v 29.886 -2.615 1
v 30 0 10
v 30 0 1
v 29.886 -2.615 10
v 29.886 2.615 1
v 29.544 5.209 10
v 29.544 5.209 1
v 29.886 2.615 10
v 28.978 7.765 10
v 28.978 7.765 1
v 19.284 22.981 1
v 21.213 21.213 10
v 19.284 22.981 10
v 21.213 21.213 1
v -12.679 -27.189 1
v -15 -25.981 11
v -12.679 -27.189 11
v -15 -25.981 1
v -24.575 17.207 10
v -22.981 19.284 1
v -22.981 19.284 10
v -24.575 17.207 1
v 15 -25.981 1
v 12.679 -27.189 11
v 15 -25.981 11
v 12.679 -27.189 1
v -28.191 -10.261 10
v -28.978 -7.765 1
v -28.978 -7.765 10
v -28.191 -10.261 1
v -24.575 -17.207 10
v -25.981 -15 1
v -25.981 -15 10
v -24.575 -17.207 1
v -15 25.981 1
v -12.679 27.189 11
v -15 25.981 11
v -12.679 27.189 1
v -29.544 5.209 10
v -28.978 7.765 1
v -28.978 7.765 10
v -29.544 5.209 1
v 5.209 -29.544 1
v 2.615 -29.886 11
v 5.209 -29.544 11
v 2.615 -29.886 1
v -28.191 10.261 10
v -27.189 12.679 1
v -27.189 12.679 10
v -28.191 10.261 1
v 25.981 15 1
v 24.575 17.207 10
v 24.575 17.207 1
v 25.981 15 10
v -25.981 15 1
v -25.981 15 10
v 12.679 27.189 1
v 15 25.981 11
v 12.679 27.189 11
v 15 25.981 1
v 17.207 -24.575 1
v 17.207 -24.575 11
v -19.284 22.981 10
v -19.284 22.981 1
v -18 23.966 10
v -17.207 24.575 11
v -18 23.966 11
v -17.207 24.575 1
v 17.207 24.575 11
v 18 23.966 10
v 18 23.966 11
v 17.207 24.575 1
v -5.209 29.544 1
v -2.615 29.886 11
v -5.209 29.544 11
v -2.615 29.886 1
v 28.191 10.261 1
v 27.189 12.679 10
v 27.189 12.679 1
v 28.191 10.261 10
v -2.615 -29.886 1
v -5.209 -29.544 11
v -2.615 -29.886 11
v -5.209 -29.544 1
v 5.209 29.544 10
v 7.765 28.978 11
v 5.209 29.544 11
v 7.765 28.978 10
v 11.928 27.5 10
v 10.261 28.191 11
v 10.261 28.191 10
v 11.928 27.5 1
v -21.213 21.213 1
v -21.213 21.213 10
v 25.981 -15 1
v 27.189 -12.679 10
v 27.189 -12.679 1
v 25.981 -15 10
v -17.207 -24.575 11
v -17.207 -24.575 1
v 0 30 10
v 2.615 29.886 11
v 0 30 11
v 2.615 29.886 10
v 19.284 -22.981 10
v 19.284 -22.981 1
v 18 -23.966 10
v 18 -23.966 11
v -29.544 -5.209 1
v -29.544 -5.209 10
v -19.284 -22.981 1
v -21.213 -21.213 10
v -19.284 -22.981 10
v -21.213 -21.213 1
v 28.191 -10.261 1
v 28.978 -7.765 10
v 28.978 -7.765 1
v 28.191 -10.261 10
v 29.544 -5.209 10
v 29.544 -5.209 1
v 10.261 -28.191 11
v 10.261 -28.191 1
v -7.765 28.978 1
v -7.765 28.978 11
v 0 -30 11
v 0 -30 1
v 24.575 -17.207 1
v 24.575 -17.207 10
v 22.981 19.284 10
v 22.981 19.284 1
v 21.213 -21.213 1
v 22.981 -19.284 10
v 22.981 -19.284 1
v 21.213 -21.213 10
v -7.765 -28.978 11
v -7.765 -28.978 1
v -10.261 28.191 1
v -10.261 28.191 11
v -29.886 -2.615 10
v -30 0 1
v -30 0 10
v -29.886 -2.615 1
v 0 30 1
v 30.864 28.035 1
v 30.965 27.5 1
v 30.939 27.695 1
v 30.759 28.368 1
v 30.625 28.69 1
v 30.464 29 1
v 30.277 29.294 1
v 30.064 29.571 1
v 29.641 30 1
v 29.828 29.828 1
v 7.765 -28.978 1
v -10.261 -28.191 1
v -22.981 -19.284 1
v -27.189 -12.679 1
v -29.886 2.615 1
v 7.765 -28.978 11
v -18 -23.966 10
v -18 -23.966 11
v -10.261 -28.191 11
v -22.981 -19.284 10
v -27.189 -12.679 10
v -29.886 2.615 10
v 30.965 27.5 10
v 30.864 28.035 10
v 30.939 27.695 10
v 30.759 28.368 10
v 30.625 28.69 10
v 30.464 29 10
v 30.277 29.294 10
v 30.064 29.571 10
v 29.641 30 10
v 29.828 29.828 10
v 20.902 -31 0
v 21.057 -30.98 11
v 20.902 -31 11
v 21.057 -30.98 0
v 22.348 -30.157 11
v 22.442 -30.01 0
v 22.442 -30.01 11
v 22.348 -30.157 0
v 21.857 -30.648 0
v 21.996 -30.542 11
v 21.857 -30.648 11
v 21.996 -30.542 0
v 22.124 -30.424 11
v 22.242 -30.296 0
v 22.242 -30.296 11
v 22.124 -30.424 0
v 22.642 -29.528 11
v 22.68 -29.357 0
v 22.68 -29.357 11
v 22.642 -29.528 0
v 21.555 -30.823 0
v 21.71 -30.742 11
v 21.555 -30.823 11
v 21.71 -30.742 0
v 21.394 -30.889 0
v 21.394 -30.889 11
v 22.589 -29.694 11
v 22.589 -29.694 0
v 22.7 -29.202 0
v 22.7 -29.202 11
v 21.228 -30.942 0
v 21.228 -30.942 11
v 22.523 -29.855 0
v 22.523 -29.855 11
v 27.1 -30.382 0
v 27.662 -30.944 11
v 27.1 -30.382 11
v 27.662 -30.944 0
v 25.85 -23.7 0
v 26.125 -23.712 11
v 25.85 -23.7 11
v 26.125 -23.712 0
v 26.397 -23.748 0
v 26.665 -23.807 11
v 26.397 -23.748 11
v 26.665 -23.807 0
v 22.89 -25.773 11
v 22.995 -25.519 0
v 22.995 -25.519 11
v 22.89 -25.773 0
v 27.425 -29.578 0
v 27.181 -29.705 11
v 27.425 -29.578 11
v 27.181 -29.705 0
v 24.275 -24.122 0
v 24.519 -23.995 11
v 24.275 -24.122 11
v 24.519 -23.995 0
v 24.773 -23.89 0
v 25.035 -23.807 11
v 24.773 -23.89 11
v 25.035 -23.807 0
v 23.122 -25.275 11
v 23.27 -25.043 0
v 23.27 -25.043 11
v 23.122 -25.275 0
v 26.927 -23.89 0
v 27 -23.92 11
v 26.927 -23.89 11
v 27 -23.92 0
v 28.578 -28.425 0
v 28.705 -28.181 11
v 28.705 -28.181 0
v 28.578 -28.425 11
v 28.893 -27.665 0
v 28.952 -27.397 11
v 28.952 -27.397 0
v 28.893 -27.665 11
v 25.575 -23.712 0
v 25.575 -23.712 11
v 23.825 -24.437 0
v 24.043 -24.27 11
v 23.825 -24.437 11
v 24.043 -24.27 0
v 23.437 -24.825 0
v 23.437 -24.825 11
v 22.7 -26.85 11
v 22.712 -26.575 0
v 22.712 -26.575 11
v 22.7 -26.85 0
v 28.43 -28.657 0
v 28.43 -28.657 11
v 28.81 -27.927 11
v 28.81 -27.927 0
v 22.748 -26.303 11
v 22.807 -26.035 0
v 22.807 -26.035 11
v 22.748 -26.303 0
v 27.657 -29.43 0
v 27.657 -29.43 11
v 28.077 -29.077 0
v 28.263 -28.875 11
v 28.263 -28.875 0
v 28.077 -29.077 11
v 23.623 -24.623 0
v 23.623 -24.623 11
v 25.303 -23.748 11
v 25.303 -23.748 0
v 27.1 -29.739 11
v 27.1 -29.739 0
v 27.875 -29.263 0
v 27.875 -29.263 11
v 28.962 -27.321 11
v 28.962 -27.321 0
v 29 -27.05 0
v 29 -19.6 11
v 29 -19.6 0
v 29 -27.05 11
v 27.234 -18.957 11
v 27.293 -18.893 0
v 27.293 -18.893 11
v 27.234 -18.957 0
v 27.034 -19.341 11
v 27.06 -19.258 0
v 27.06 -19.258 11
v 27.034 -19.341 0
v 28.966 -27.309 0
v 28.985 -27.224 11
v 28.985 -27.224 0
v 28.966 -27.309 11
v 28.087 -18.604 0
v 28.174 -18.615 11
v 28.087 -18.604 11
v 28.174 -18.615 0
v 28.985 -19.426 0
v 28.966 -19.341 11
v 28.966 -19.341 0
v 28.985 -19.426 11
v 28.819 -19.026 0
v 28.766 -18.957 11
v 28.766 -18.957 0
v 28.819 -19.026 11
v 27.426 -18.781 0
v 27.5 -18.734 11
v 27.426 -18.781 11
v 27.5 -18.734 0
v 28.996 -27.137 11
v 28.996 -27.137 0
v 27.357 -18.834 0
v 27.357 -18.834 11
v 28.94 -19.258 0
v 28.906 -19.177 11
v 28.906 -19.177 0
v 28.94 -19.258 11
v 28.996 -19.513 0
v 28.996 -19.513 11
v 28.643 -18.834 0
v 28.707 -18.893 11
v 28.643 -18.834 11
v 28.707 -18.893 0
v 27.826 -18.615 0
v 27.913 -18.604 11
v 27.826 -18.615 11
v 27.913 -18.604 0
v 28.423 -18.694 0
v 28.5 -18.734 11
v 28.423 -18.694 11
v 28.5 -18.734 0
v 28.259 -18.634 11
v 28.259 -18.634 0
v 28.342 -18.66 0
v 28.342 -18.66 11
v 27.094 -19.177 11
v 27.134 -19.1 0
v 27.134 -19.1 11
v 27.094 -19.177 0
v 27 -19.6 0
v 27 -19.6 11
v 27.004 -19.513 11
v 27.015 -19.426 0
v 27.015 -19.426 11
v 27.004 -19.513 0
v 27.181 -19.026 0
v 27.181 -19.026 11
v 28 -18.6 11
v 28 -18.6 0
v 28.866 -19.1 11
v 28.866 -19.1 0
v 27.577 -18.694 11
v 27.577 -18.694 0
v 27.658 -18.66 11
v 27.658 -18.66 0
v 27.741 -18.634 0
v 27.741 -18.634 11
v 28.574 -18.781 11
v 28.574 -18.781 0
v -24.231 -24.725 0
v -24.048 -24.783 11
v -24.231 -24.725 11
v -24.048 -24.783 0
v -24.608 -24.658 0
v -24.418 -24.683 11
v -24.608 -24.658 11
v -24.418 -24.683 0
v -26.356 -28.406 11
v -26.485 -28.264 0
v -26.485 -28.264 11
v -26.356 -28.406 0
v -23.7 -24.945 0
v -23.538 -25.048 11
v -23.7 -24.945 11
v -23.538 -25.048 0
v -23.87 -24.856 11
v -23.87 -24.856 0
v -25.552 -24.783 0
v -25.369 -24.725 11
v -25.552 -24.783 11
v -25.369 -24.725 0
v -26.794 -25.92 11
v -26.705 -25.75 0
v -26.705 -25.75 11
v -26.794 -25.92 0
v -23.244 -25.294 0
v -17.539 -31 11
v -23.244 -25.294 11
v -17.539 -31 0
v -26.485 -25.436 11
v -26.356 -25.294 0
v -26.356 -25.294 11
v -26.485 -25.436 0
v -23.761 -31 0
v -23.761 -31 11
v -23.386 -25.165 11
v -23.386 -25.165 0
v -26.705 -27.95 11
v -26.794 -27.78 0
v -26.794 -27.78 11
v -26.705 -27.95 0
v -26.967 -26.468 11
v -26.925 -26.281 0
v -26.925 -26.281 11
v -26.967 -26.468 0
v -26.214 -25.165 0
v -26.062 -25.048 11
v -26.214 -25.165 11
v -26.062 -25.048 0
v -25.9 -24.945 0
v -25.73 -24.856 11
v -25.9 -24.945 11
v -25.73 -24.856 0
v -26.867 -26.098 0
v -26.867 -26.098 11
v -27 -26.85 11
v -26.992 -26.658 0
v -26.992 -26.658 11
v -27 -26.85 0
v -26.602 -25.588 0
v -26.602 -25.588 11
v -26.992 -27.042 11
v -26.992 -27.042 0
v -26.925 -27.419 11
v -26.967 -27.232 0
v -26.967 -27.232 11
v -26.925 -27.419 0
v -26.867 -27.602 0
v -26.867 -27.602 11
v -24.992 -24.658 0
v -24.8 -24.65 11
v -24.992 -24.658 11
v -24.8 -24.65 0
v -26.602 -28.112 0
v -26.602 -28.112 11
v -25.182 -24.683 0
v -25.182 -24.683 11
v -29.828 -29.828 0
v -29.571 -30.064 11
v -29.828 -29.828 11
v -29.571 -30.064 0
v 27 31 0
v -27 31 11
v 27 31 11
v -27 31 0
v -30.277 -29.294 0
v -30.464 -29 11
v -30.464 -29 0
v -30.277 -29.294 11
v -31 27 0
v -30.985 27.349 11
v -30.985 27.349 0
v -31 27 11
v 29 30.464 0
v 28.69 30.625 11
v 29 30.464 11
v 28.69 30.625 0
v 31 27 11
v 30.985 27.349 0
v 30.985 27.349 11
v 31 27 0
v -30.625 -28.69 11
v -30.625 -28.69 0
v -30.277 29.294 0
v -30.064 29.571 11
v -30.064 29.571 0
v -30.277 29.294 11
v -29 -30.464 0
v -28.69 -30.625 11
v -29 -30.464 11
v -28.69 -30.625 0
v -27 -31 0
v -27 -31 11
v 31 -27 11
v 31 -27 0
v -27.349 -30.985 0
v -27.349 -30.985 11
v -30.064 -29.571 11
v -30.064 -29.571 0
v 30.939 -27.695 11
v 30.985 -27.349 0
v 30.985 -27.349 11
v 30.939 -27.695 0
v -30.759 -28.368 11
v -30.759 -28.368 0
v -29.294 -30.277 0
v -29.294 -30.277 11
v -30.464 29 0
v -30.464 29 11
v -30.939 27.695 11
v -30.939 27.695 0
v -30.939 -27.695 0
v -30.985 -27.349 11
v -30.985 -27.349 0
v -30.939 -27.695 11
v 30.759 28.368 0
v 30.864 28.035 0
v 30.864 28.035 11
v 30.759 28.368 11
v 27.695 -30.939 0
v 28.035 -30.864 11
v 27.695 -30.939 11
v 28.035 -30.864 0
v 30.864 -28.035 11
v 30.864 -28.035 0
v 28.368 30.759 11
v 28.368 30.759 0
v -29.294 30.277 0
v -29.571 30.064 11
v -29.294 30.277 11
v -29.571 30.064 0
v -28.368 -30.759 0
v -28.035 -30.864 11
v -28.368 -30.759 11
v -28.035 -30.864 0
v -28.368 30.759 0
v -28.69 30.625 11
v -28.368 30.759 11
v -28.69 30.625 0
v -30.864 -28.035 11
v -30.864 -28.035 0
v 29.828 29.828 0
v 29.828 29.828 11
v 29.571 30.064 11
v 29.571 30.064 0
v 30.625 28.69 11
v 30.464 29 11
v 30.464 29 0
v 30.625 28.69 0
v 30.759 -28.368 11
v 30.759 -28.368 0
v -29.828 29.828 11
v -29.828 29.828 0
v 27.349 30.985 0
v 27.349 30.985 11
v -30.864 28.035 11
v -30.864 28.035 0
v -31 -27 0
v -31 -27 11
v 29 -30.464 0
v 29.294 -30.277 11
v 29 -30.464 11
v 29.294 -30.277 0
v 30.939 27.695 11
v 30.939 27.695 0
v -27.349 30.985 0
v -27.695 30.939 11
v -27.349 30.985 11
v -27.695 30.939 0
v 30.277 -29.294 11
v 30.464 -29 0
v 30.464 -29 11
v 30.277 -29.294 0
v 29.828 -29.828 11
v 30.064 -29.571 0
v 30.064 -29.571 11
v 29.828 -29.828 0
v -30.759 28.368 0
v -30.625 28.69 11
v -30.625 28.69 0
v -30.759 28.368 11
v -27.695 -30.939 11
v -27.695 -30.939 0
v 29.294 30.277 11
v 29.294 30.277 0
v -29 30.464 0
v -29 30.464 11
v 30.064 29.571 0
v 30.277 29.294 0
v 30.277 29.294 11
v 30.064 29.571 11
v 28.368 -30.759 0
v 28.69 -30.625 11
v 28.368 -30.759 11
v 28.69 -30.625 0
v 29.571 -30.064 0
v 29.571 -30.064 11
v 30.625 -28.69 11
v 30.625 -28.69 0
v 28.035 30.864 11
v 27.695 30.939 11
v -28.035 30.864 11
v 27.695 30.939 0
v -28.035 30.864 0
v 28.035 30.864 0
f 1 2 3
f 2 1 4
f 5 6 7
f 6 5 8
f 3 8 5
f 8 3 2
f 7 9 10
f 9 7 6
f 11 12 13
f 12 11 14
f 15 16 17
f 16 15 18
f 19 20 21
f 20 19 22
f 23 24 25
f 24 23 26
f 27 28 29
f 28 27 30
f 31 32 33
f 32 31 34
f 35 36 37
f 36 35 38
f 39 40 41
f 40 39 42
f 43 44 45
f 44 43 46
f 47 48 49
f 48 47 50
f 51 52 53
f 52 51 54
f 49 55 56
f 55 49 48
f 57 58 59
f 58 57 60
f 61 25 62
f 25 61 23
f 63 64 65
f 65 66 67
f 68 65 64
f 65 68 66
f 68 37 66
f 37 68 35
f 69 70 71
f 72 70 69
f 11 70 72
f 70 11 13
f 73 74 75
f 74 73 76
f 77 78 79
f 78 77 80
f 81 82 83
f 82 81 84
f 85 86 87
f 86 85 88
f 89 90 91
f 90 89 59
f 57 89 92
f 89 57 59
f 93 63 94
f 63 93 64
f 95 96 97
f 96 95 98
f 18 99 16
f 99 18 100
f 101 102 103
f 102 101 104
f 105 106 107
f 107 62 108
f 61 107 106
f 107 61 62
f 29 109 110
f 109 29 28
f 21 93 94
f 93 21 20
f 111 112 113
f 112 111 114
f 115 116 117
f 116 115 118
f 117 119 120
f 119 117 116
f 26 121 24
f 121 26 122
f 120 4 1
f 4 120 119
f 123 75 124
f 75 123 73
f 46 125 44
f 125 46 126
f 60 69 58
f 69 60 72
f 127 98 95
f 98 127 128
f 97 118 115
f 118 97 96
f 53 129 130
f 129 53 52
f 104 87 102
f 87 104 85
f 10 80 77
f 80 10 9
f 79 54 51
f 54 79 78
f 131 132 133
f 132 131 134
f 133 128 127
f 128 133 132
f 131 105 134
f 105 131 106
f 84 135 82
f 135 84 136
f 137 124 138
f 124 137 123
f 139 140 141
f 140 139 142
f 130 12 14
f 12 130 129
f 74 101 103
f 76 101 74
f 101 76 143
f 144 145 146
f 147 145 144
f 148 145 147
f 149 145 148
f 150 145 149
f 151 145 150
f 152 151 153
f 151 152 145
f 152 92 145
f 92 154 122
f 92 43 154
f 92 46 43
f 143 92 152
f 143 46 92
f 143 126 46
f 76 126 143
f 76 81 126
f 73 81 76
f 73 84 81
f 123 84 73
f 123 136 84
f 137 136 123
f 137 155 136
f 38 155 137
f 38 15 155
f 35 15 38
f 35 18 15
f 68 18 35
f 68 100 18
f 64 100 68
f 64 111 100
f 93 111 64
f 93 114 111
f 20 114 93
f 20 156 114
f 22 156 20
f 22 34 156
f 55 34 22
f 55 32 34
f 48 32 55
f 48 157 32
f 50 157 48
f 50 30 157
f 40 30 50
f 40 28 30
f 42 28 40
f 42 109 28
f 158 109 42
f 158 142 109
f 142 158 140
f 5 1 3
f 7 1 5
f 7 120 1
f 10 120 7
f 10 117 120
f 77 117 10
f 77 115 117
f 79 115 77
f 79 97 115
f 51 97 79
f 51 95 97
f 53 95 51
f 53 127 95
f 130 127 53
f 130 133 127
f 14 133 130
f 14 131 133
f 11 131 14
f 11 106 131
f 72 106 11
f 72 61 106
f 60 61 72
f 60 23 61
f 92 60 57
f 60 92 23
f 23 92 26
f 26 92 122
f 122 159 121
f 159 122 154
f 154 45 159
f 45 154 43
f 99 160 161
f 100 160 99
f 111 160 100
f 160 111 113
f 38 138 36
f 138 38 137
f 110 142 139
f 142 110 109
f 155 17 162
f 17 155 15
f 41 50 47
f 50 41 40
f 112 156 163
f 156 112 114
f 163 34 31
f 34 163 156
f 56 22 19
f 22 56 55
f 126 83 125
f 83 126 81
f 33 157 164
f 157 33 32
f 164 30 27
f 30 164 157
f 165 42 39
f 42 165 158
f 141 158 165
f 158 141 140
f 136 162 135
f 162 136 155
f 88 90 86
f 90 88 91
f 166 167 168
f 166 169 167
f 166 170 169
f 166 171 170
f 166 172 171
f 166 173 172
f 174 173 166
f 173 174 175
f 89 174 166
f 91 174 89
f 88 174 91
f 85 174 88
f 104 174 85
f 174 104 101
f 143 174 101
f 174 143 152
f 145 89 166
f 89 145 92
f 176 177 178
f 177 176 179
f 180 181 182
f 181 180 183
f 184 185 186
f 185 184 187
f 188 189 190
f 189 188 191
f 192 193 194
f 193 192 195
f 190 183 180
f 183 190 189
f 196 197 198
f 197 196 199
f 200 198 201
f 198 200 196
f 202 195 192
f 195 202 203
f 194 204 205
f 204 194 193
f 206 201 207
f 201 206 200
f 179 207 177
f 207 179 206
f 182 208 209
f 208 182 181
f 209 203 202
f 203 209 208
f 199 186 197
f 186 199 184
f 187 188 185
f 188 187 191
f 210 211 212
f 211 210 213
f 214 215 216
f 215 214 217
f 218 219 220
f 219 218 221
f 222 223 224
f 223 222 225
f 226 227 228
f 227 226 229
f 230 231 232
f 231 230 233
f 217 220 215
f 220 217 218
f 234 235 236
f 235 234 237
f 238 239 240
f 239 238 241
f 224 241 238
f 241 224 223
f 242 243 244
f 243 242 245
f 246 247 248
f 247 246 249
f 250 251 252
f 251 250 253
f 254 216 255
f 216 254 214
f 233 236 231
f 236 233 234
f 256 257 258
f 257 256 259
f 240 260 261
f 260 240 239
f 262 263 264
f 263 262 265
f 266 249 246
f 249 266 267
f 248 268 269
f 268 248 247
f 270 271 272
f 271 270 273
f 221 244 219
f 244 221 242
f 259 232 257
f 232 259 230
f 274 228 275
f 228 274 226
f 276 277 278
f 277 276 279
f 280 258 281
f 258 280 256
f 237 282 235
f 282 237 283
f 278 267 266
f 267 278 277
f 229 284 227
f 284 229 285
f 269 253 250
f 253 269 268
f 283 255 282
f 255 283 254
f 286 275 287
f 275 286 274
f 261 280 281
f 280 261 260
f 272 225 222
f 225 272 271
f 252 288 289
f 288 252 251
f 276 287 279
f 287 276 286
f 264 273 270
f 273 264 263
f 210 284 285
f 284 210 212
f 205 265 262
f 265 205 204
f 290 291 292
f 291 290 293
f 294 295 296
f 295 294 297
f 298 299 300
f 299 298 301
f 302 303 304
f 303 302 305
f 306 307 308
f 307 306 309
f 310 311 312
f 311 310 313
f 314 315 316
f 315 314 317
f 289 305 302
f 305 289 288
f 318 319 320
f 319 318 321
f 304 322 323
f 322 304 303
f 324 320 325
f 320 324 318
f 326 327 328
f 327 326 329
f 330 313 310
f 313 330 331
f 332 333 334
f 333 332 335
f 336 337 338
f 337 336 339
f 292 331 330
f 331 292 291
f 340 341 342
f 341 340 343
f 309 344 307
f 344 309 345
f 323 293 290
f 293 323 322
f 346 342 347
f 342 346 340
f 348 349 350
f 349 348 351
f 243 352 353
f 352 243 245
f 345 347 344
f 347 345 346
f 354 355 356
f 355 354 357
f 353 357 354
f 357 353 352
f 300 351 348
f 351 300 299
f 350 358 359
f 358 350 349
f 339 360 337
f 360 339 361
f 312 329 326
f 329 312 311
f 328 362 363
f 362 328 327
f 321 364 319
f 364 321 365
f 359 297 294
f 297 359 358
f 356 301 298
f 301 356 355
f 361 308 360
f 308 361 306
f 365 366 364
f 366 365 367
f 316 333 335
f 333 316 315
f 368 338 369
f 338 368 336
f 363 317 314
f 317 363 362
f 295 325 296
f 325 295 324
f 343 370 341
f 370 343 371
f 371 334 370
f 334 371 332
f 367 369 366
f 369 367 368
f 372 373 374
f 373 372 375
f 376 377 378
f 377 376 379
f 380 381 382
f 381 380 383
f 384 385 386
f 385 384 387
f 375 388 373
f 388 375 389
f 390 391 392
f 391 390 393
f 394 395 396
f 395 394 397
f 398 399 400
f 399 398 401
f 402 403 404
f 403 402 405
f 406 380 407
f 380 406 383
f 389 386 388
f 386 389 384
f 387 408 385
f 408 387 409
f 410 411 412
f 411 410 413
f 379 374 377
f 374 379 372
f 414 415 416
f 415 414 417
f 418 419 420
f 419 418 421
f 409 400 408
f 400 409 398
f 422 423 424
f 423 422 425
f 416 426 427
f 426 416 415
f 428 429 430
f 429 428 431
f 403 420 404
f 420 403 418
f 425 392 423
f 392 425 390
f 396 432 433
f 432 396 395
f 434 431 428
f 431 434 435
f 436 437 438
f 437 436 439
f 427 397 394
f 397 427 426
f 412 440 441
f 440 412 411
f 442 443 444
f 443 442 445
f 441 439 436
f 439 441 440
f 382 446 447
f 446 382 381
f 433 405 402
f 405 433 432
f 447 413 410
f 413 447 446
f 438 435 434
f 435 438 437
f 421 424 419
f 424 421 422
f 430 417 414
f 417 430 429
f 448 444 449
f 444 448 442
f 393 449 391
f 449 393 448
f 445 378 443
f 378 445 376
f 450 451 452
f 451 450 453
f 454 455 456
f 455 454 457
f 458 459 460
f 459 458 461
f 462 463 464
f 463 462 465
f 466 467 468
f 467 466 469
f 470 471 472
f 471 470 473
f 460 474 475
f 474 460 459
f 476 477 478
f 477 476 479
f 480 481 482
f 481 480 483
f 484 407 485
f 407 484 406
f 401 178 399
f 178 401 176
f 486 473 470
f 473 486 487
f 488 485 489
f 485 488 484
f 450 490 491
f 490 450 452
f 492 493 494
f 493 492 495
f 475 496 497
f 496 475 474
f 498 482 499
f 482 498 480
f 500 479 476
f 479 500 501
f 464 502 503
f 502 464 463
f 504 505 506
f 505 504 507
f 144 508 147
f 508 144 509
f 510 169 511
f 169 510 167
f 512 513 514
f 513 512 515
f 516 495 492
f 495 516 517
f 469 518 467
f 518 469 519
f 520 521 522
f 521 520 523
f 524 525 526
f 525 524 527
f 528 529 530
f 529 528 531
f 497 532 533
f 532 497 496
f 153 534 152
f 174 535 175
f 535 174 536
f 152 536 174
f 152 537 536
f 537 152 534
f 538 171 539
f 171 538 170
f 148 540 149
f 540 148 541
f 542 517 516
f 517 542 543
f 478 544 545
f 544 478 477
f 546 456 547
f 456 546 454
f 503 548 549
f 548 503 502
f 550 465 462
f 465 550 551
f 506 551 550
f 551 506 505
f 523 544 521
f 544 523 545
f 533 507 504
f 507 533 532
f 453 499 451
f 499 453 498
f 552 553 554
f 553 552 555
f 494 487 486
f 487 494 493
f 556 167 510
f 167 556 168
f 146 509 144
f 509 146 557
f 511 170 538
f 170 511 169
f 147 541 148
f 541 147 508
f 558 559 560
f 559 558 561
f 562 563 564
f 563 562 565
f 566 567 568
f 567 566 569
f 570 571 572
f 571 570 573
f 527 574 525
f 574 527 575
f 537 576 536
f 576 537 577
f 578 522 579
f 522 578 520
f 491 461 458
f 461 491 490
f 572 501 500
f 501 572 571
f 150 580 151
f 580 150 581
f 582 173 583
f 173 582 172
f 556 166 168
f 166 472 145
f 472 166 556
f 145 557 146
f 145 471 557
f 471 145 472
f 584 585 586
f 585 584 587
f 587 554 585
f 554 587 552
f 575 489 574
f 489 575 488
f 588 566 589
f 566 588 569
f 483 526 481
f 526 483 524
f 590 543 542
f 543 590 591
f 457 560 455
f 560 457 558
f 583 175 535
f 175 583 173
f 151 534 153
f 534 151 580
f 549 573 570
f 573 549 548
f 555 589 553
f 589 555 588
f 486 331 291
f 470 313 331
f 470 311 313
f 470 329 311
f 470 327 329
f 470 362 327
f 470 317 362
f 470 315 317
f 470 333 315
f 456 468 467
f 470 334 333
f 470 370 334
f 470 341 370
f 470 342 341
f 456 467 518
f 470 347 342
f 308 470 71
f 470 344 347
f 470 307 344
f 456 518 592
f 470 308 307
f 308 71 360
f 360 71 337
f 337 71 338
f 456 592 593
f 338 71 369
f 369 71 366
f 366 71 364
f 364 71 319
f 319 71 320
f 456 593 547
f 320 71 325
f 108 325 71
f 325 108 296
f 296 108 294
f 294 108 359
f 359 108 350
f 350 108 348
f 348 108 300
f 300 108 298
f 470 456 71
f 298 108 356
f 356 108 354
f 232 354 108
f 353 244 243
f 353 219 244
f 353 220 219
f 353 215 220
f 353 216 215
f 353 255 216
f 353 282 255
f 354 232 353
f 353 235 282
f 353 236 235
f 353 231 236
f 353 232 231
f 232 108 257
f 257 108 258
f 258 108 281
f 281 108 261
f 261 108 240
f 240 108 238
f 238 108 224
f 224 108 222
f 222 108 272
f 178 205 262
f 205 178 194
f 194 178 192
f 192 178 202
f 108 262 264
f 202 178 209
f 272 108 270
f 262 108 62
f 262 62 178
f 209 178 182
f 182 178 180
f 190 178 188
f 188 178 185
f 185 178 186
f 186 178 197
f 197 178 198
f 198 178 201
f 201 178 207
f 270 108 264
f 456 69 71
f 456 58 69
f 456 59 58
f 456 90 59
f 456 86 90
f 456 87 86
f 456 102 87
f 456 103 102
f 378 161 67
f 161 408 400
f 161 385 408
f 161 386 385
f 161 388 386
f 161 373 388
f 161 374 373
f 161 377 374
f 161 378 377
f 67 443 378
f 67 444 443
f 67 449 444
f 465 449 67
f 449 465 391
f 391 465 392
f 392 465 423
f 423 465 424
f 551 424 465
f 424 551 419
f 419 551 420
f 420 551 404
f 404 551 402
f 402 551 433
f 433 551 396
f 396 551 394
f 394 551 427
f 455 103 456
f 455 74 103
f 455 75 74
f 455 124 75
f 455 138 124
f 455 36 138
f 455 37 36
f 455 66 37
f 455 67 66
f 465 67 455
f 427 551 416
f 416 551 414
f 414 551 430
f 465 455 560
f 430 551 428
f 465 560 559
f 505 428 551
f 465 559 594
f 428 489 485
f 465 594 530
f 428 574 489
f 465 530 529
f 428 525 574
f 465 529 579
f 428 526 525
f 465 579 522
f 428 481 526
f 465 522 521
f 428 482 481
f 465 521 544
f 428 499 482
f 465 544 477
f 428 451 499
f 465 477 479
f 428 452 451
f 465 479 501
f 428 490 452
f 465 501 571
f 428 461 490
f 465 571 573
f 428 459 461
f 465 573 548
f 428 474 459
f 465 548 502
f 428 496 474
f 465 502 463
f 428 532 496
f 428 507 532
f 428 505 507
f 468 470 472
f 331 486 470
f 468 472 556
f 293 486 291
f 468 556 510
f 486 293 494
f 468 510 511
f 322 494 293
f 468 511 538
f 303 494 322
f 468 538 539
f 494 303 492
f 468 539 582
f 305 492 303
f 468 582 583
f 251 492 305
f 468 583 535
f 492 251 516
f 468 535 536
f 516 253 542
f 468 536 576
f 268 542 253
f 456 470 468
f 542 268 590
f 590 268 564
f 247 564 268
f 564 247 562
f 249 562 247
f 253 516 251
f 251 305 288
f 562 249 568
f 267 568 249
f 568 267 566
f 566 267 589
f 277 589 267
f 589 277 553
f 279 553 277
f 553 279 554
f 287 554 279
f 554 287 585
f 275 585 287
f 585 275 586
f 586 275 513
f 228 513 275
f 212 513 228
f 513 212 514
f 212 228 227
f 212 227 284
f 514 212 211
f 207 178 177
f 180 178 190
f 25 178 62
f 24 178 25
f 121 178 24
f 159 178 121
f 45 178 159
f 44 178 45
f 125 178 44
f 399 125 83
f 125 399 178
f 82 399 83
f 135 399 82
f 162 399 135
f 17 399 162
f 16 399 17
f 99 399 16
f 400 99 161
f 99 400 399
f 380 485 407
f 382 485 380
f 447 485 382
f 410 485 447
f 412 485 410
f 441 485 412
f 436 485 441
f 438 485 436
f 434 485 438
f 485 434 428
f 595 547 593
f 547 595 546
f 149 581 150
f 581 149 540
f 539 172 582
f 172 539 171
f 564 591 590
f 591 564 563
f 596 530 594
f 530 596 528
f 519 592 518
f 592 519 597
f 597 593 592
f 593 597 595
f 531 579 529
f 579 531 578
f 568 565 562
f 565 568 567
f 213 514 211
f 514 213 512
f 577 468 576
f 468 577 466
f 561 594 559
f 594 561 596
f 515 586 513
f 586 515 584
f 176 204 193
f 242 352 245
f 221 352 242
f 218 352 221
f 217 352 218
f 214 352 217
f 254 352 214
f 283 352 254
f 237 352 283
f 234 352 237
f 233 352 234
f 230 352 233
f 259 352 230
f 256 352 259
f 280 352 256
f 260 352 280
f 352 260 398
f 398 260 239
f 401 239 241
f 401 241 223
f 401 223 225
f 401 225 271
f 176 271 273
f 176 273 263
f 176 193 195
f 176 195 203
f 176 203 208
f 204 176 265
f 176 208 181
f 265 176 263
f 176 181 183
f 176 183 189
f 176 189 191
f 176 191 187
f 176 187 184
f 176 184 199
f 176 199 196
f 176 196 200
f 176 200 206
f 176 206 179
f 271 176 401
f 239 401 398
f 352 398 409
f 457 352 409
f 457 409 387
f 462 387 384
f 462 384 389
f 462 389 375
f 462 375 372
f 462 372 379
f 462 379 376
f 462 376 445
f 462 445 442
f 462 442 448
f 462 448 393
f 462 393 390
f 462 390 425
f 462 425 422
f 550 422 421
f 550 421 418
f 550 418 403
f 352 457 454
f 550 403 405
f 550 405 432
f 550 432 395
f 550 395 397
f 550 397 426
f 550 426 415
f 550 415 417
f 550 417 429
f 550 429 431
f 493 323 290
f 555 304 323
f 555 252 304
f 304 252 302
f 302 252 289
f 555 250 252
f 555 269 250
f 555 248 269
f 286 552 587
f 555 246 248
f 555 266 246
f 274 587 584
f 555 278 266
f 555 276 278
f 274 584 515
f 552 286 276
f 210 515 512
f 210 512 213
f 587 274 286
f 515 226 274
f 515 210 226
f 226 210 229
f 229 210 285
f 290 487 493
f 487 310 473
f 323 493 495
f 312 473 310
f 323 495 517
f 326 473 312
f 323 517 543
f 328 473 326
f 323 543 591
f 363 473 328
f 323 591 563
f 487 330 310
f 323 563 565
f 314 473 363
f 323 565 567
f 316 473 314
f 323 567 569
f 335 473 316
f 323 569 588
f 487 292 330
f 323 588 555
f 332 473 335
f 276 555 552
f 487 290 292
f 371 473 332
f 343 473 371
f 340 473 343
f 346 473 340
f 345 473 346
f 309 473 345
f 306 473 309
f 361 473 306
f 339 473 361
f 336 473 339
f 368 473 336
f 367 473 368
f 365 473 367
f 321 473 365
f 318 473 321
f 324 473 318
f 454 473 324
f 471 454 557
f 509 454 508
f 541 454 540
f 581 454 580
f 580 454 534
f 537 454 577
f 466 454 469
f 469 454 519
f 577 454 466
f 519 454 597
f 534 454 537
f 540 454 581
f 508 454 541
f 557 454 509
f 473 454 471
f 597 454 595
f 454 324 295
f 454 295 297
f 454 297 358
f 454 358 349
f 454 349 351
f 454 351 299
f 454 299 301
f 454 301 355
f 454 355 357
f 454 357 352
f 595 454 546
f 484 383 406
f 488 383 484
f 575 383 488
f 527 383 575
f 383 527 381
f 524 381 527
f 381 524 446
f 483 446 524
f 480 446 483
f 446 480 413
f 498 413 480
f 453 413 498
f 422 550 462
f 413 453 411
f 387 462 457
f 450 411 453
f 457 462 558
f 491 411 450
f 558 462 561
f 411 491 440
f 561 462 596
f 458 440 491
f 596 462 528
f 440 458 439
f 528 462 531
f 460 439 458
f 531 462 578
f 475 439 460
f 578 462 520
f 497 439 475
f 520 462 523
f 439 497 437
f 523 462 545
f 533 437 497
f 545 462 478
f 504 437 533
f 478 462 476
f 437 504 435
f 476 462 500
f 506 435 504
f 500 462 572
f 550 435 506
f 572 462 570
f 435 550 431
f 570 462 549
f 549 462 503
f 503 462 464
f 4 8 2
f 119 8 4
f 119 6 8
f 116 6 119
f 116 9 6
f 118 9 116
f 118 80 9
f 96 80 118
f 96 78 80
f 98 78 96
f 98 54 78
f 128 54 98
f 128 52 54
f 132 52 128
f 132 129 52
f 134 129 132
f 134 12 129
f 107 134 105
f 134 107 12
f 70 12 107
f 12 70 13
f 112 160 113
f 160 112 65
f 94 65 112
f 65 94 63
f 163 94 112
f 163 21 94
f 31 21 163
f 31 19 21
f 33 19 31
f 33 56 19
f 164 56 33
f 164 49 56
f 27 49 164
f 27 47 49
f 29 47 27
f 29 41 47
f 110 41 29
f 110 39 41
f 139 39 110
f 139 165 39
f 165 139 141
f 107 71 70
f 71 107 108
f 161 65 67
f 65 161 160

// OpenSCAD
// SMDispenser.scad
// SMD component dispenser
// CC-BY-SA
// Brian K. White - b.kenyon.w@gmail.com 2025

// to adjust fit, wobble, snap, etc:
// look at these bvariables below:
//   fitment_clearance = gap left between mating parts
//   detent_height = how far the clip is forced to deflect
//   clip_thickness = thickness (stiffness) of the clip

//PRINT = "base";
PRINT = "caddy";
//PRINT = "cap"; // end cap, only needed if spool_retainer_walls=false
//PRINT = "testkit"; // caddy and stubby base for quick print for test fitting
preview_fully_populated = false;

// MAIN USER OPTIONS

// CADDY SIZE
// Fitment clearances are already added to the given strip dimensions
// so you can just use the actual strip dimensions like 8mm x 1mm
// for most common paper 0805 etc.

// some sample strip dimensions

// 8x1    1206 0805 0604 paper
// 8x2    SC70, large capacity 0805 caps
// 12x2   14TSSOP 16TSSOP
// 13x3   8SOIC
// 16x2   24TSSOP
// 16x3   14SO 14SOIC 16SO 16SOIC
// 25x3   44VQFP 28TSOP-I
// 25x4   28SOIC
// 32x4   32SOP
// 33x3   48TSOP 28TSOP-II

// most 0805 paper strips are 8mmx1mm
//strip_width = 8;
//strip_thickness = 1;
//spool_diameter = 40;

// some 0805 components are taller than 1mm
//strip_width = 8;
//strip_thickness = 2;
//spool_diameter = 40;

// 0604 0805 1206
//strip_width = 8;
//strip_thickness = 1;
//spool_diameter = 60;

// 0805 1206
strip_width = 8;
strip_thickness = 2;
spool_diameter = 60;

// 14TSSOP 16TSSOP
//strip_width = 12;
//strip_thickness = 2;
//spool_diameter = 60;

// 14SO 14SOIC 16SO 16SOIC
//strip_width = 16;
//strip_thickness = 3;
//spool_diameter = 120;

// 44VQFP 28TSOP-I 28SOIC
//strip_width = 25;
//strip_thickness = 4;
//spool_diameter = 120;

// 32SOP 48TSOP 28TSOP-II
//strip_width = 33;
//strip_thickness = 4;
//spool_diameter = 120;

// Do you want little walls to contain the spool?
// Set false if you can't print the bridges well enough.
// With the walls, each caddy holds it's spool in by itself.
// Without the walls, the spools are only trapped by the next caddy in line,
// and you can print the end cap to cover the left-most caddy.
// Set preview_fully_populated=true to see it.
spool_retainer_walls = true;


///////////////////////////////////////////////////////////////////////////////////
// CUSTOMIZATION

// height of partial walls to trap the spool
spool_traps_depth = strip_thickness*6;

slot_fc = 0.5; // fitment clearance just for the dispenser slot
fitment_clearance = (spool_diameter<50?0.1:0.2); // fitment clearance for everything else

// Base
base_length = 120;
base_tilt_angle = 0;

// End Cap
// thin solid blank caddy shape used as end cap when spool_retainer_wall=false
cap_thickness = 4;

///////////////////////////////////////////////////////////////////////////////////

wall_thickness = 1;
corner_radius = spool_diameter/15;

rail_width = spool_diameter/15;

clip_thickness =
  spool_diameter<50 ? 1 :
  2;

// this may be too aggressive depending on your printers accuracy
// at printing the little J on the end of the clip
detent_height = clip_thickness*0.75 + fitment_clearance*2;
// little milder
//detent_height = clip_thickness/2 + fitment_clearance*2;

///////////////////////////////////////////////////////////////////////////////////


e = 0.01;
$fn=72;
$fa = 6;
$fs = 0.5;

fc = fitment_clearance; // abreviation just because it's used a lot
body_width = spool_diameter + wall_thickness*2;
body_depth = body_width;
body_height = wall_thickness + slot_fc + strip_width + slot_fc + (spool_retainer_walls?wall_thickness:0);
spool_radius = spool_diameter/2;

module mirror_copy(v = [1, 0, 0]) {
  children();
  mirror(v) children();
}

module sqylinder (w=10,d=10,h=10,r=1) {
  hull() {
    mirror_copy([0,1,0]) translate([0,d/2-r,0])
      mirror_copy([1,0,0]) translate([w/2-r,0,0])
        cylinder(h=h,r=r,center=true);
  }
}

// r = outside radius
// l = loops
// h = height
// w = width
// s = space between loops
module spiral(r=10, l=1, h=1, w=1, s=1) {

  // this math for s is not quite right but close
  x = 360/w;
  o = x - s/w*x;
  W = w + s;
  R = r - l*W;

  linear_extrude(h=h)
    polygon(points= concat(
        [ for (t = [0:360*l])    [ (R-W+t/o)*sin(t), (R-W+t/o)*cos(t) ] ],
        [ for (t = [360*l:-1:0]) [ (R-s+t/o)*sin(t), (R-s+t/o)*cos(t) ] ]
      )
    );
}

module spool() {
  loops=4;
  translate([0,0,wall_thickness+slot_fc]) {
    spiral(r=spool_radius-slot_fc/2,l=loops,h=strip_width,w=strip_thickness,s=fc);
    translate([-e,spool_radius-strip_thickness-slot_fc/2,0]) cube([body_width*0.75,strip_thickness,strip_width]);
  }
}

// bottom rail shape & position
// used by both the male & female parts
brr = rail_width/2 + detent_height/2; // bottom rail radius
brx = body_width/2 - brr - clip_thickness - fc; // x position
bry = -body_depth/2 + brr + fc + wall_thickness; // y position
bra = wall_thickness + fc + brr; // connector above edge
brb = rail_width/2 + fc; // connector below edge
module bottom_rail (h,f=false) {
  x = f ? fc : 0; // fitment clearance added to some things if female

  // main bar
  translate([brx,bry,0]) cylinder(r=brr+x,h=h);

  // connector
  translate([brx-brr-x,-body_depth/2-fc-rail_width/2,0]) cube([x+rail_width+x,bra+brb,h]);

  // chamfer
  if (f) {
    translate([brx-brr+rail_width/2,-body_depth/2-e,0]) rotate([0,0,45]) translate([-rail_width/2,-rail_width/2,0]) cube([rail_width,rail_width,h]);
    // round the corner helps print assembeled in-place
    //r = corner_radius;
    r = corner_radius/2;
    //r = wall_thickness;
    translate([-r+brx-brr-x+e,r-body_depth/2-e,0]) difference() {
      translate([0,-r,-1]) cube([r,r,h+2]);
      translate([0,0,-2]) cylinder(r=r,h=h+4);
    }
  }

  // compliance slot
  // only used on female part
  if (f) {
    w = 2;     // slot width

    r = w/2;
    a = body_width/2 - r - clip_thickness; // slot horizontal position
    b = -body_depth/2+wall_thickness+brr; // bottom of slot centered on main bar

    // cheeseball auto scaling depth of cut
    // scales with compliant part thickness, width, deflection
    p = b + (h+detent_height)*(clip_thickness/4); // pending top

    // max allowable depth of cut leaving wall_thickness to spool
    c = spool_radius + wall_thickness + r; // diagonal distance center-center
    m = -sqrt(c^2-a^2); // max top

    // top of slot is p if possible, else m
    t = p>m?m:p; // top of slot

    hull() {
      translate([a,t,0]) cylinder(r=r,h=h);
      translate([a,b,0]) cylinder(r=r,h=h);
    }

  }

}

// top rail shape & position
// used by both the male & female parts
trx = -body_width/2 + rail_width/2+fc+rail_width  ; // x position
module top_rail (h,f=false) {
    hull() {
      d = rail_width+(f?fc*2:0);
      translate([trx,-body_depth/2+bra,0]) cylinder(d=d,h=h);
      translate([trx+bra+brb,-body_depth/2-brb,0]) cylinder(d=d,h=h);
    }      
}


module caddy(solid=0) {

  cap = (solid>0); // if solid>0 then we are making a cap
  bh = cap ? solid : body_height; // body height
  slot_depth = strip_thickness + slot_fc;
  slot_height = spool_retainer_walls ? slot_fc + strip_width + slot_fc : body_height ;

  difference() {

    // add
    // main rounded square body
    translate([0,0,bh/2]) sqylinder(w=body_width,d=body_depth,h=bh,r=corner_radius);

    // cut
    group() {
      
      H = bh+2;

      // skip for cap
      if (!cap) translate([0,0,wall_thickness]) {
        // spool cavity
        cylinder(d=spool_diameter,h=bh);
        // dispenser slot
        translate([0,spool_radius-slot_depth,0]) cube([spool_diameter,slot_depth,slot_height]);
      }

      // rail sockets
      translate([0,0,-1]) {
        top_rail(h=H,f=true);
        bottom_rail(h=H,f=true);
      }

    }

  }

  // add
  // partial walls to trap the spool
  // skip for cap
  if (spool_retainer_walls && !cap) {
    translate([0,0,body_height-wall_thickness]) difference() {
      cylinder(d=spool_diameter+wall_thickness,h=wall_thickness);
      cube([spool_diameter-spool_traps_depth*2,body_depth,body_height],center=true);
    }
  }

  // imaginary spool
  // skip for cap
  if (!cap) %spool();
}

bsr = rail_width/4;
bsy = -body_depth/2+bsr-fc-rail_width;
module base (l=120) {

  difference() {
    group() {

      // plinth
      hull() {
        translate([trx+bra+brb,-body_depth/2-brb,0])
          cylinder(d=rail_width,h=l);
        translate([brx-detent_height/2,-body_depth/2-brb,0])
          cylinder(d=rail_width,h=l);

        // if there is a tilt angle
        // move to the center of the bottom-right corner radius
        // rotate, move back        
        tx = (base_tilt_angle?body_width/2-corner_radius:0);
        ty = (base_tilt_angle?body_depth/2-corner_radius:0);
        translate([tx,-ty,0]) rotate([0,0,base_tilt_angle]) translate([-tx,ty,0])
          mirror_copy([1,0,0])
            translate([body_width/2-bsr,bsy,0])
              cylinder(r=bsr,h=l);
      }


      top_rail(h=l);

      bottom_rail(h=l);
    }

  }
}

///////////////////////////////////////////////////////////////////////////////////
// render

if ($preview || is_undef(PRINT)) {
  if (preview_fully_populated) translate([0,base_length/2,body_depth/2+fc+1]) rotate([90,base_tilt_angle,0]) {
    // full length base
    base(l=base_length);
    // as many caddies as fits
    s = body_height+fc;
    l = base_length - s - (spool_retainer_walls?0:cap_thickness+fc);
    for(i = [0 : s : l]) {
      translate([0,0,i]) caddy();
      if (!spool_retainer_walls && i+s>l) translate([0,0,i+s]) caddy(solid=cap_thickness);
    }
  } else {
    // single caddy base
    base(l=body_height*1.5);
    // single caddy
    caddy();
  }
} // $preview
else if (PRINT=="caddy") caddy();
else if (PRINT=="cap") caddy(solid=cap_thickness);
else if (PRINT=="base") translate([0,body_depth/2,0]) base(l=base_length);
else if (PRINT=="testkit") {
  caddy();
  translate([body_width/2+rail_width*2+base_tilt_angle/3,0,0])
  rotate([0,0,-90-base_tilt_angle])
  translate([0,rail_width+fc+body_depth/2,0])
    base(l=body_height*1.5);
}
